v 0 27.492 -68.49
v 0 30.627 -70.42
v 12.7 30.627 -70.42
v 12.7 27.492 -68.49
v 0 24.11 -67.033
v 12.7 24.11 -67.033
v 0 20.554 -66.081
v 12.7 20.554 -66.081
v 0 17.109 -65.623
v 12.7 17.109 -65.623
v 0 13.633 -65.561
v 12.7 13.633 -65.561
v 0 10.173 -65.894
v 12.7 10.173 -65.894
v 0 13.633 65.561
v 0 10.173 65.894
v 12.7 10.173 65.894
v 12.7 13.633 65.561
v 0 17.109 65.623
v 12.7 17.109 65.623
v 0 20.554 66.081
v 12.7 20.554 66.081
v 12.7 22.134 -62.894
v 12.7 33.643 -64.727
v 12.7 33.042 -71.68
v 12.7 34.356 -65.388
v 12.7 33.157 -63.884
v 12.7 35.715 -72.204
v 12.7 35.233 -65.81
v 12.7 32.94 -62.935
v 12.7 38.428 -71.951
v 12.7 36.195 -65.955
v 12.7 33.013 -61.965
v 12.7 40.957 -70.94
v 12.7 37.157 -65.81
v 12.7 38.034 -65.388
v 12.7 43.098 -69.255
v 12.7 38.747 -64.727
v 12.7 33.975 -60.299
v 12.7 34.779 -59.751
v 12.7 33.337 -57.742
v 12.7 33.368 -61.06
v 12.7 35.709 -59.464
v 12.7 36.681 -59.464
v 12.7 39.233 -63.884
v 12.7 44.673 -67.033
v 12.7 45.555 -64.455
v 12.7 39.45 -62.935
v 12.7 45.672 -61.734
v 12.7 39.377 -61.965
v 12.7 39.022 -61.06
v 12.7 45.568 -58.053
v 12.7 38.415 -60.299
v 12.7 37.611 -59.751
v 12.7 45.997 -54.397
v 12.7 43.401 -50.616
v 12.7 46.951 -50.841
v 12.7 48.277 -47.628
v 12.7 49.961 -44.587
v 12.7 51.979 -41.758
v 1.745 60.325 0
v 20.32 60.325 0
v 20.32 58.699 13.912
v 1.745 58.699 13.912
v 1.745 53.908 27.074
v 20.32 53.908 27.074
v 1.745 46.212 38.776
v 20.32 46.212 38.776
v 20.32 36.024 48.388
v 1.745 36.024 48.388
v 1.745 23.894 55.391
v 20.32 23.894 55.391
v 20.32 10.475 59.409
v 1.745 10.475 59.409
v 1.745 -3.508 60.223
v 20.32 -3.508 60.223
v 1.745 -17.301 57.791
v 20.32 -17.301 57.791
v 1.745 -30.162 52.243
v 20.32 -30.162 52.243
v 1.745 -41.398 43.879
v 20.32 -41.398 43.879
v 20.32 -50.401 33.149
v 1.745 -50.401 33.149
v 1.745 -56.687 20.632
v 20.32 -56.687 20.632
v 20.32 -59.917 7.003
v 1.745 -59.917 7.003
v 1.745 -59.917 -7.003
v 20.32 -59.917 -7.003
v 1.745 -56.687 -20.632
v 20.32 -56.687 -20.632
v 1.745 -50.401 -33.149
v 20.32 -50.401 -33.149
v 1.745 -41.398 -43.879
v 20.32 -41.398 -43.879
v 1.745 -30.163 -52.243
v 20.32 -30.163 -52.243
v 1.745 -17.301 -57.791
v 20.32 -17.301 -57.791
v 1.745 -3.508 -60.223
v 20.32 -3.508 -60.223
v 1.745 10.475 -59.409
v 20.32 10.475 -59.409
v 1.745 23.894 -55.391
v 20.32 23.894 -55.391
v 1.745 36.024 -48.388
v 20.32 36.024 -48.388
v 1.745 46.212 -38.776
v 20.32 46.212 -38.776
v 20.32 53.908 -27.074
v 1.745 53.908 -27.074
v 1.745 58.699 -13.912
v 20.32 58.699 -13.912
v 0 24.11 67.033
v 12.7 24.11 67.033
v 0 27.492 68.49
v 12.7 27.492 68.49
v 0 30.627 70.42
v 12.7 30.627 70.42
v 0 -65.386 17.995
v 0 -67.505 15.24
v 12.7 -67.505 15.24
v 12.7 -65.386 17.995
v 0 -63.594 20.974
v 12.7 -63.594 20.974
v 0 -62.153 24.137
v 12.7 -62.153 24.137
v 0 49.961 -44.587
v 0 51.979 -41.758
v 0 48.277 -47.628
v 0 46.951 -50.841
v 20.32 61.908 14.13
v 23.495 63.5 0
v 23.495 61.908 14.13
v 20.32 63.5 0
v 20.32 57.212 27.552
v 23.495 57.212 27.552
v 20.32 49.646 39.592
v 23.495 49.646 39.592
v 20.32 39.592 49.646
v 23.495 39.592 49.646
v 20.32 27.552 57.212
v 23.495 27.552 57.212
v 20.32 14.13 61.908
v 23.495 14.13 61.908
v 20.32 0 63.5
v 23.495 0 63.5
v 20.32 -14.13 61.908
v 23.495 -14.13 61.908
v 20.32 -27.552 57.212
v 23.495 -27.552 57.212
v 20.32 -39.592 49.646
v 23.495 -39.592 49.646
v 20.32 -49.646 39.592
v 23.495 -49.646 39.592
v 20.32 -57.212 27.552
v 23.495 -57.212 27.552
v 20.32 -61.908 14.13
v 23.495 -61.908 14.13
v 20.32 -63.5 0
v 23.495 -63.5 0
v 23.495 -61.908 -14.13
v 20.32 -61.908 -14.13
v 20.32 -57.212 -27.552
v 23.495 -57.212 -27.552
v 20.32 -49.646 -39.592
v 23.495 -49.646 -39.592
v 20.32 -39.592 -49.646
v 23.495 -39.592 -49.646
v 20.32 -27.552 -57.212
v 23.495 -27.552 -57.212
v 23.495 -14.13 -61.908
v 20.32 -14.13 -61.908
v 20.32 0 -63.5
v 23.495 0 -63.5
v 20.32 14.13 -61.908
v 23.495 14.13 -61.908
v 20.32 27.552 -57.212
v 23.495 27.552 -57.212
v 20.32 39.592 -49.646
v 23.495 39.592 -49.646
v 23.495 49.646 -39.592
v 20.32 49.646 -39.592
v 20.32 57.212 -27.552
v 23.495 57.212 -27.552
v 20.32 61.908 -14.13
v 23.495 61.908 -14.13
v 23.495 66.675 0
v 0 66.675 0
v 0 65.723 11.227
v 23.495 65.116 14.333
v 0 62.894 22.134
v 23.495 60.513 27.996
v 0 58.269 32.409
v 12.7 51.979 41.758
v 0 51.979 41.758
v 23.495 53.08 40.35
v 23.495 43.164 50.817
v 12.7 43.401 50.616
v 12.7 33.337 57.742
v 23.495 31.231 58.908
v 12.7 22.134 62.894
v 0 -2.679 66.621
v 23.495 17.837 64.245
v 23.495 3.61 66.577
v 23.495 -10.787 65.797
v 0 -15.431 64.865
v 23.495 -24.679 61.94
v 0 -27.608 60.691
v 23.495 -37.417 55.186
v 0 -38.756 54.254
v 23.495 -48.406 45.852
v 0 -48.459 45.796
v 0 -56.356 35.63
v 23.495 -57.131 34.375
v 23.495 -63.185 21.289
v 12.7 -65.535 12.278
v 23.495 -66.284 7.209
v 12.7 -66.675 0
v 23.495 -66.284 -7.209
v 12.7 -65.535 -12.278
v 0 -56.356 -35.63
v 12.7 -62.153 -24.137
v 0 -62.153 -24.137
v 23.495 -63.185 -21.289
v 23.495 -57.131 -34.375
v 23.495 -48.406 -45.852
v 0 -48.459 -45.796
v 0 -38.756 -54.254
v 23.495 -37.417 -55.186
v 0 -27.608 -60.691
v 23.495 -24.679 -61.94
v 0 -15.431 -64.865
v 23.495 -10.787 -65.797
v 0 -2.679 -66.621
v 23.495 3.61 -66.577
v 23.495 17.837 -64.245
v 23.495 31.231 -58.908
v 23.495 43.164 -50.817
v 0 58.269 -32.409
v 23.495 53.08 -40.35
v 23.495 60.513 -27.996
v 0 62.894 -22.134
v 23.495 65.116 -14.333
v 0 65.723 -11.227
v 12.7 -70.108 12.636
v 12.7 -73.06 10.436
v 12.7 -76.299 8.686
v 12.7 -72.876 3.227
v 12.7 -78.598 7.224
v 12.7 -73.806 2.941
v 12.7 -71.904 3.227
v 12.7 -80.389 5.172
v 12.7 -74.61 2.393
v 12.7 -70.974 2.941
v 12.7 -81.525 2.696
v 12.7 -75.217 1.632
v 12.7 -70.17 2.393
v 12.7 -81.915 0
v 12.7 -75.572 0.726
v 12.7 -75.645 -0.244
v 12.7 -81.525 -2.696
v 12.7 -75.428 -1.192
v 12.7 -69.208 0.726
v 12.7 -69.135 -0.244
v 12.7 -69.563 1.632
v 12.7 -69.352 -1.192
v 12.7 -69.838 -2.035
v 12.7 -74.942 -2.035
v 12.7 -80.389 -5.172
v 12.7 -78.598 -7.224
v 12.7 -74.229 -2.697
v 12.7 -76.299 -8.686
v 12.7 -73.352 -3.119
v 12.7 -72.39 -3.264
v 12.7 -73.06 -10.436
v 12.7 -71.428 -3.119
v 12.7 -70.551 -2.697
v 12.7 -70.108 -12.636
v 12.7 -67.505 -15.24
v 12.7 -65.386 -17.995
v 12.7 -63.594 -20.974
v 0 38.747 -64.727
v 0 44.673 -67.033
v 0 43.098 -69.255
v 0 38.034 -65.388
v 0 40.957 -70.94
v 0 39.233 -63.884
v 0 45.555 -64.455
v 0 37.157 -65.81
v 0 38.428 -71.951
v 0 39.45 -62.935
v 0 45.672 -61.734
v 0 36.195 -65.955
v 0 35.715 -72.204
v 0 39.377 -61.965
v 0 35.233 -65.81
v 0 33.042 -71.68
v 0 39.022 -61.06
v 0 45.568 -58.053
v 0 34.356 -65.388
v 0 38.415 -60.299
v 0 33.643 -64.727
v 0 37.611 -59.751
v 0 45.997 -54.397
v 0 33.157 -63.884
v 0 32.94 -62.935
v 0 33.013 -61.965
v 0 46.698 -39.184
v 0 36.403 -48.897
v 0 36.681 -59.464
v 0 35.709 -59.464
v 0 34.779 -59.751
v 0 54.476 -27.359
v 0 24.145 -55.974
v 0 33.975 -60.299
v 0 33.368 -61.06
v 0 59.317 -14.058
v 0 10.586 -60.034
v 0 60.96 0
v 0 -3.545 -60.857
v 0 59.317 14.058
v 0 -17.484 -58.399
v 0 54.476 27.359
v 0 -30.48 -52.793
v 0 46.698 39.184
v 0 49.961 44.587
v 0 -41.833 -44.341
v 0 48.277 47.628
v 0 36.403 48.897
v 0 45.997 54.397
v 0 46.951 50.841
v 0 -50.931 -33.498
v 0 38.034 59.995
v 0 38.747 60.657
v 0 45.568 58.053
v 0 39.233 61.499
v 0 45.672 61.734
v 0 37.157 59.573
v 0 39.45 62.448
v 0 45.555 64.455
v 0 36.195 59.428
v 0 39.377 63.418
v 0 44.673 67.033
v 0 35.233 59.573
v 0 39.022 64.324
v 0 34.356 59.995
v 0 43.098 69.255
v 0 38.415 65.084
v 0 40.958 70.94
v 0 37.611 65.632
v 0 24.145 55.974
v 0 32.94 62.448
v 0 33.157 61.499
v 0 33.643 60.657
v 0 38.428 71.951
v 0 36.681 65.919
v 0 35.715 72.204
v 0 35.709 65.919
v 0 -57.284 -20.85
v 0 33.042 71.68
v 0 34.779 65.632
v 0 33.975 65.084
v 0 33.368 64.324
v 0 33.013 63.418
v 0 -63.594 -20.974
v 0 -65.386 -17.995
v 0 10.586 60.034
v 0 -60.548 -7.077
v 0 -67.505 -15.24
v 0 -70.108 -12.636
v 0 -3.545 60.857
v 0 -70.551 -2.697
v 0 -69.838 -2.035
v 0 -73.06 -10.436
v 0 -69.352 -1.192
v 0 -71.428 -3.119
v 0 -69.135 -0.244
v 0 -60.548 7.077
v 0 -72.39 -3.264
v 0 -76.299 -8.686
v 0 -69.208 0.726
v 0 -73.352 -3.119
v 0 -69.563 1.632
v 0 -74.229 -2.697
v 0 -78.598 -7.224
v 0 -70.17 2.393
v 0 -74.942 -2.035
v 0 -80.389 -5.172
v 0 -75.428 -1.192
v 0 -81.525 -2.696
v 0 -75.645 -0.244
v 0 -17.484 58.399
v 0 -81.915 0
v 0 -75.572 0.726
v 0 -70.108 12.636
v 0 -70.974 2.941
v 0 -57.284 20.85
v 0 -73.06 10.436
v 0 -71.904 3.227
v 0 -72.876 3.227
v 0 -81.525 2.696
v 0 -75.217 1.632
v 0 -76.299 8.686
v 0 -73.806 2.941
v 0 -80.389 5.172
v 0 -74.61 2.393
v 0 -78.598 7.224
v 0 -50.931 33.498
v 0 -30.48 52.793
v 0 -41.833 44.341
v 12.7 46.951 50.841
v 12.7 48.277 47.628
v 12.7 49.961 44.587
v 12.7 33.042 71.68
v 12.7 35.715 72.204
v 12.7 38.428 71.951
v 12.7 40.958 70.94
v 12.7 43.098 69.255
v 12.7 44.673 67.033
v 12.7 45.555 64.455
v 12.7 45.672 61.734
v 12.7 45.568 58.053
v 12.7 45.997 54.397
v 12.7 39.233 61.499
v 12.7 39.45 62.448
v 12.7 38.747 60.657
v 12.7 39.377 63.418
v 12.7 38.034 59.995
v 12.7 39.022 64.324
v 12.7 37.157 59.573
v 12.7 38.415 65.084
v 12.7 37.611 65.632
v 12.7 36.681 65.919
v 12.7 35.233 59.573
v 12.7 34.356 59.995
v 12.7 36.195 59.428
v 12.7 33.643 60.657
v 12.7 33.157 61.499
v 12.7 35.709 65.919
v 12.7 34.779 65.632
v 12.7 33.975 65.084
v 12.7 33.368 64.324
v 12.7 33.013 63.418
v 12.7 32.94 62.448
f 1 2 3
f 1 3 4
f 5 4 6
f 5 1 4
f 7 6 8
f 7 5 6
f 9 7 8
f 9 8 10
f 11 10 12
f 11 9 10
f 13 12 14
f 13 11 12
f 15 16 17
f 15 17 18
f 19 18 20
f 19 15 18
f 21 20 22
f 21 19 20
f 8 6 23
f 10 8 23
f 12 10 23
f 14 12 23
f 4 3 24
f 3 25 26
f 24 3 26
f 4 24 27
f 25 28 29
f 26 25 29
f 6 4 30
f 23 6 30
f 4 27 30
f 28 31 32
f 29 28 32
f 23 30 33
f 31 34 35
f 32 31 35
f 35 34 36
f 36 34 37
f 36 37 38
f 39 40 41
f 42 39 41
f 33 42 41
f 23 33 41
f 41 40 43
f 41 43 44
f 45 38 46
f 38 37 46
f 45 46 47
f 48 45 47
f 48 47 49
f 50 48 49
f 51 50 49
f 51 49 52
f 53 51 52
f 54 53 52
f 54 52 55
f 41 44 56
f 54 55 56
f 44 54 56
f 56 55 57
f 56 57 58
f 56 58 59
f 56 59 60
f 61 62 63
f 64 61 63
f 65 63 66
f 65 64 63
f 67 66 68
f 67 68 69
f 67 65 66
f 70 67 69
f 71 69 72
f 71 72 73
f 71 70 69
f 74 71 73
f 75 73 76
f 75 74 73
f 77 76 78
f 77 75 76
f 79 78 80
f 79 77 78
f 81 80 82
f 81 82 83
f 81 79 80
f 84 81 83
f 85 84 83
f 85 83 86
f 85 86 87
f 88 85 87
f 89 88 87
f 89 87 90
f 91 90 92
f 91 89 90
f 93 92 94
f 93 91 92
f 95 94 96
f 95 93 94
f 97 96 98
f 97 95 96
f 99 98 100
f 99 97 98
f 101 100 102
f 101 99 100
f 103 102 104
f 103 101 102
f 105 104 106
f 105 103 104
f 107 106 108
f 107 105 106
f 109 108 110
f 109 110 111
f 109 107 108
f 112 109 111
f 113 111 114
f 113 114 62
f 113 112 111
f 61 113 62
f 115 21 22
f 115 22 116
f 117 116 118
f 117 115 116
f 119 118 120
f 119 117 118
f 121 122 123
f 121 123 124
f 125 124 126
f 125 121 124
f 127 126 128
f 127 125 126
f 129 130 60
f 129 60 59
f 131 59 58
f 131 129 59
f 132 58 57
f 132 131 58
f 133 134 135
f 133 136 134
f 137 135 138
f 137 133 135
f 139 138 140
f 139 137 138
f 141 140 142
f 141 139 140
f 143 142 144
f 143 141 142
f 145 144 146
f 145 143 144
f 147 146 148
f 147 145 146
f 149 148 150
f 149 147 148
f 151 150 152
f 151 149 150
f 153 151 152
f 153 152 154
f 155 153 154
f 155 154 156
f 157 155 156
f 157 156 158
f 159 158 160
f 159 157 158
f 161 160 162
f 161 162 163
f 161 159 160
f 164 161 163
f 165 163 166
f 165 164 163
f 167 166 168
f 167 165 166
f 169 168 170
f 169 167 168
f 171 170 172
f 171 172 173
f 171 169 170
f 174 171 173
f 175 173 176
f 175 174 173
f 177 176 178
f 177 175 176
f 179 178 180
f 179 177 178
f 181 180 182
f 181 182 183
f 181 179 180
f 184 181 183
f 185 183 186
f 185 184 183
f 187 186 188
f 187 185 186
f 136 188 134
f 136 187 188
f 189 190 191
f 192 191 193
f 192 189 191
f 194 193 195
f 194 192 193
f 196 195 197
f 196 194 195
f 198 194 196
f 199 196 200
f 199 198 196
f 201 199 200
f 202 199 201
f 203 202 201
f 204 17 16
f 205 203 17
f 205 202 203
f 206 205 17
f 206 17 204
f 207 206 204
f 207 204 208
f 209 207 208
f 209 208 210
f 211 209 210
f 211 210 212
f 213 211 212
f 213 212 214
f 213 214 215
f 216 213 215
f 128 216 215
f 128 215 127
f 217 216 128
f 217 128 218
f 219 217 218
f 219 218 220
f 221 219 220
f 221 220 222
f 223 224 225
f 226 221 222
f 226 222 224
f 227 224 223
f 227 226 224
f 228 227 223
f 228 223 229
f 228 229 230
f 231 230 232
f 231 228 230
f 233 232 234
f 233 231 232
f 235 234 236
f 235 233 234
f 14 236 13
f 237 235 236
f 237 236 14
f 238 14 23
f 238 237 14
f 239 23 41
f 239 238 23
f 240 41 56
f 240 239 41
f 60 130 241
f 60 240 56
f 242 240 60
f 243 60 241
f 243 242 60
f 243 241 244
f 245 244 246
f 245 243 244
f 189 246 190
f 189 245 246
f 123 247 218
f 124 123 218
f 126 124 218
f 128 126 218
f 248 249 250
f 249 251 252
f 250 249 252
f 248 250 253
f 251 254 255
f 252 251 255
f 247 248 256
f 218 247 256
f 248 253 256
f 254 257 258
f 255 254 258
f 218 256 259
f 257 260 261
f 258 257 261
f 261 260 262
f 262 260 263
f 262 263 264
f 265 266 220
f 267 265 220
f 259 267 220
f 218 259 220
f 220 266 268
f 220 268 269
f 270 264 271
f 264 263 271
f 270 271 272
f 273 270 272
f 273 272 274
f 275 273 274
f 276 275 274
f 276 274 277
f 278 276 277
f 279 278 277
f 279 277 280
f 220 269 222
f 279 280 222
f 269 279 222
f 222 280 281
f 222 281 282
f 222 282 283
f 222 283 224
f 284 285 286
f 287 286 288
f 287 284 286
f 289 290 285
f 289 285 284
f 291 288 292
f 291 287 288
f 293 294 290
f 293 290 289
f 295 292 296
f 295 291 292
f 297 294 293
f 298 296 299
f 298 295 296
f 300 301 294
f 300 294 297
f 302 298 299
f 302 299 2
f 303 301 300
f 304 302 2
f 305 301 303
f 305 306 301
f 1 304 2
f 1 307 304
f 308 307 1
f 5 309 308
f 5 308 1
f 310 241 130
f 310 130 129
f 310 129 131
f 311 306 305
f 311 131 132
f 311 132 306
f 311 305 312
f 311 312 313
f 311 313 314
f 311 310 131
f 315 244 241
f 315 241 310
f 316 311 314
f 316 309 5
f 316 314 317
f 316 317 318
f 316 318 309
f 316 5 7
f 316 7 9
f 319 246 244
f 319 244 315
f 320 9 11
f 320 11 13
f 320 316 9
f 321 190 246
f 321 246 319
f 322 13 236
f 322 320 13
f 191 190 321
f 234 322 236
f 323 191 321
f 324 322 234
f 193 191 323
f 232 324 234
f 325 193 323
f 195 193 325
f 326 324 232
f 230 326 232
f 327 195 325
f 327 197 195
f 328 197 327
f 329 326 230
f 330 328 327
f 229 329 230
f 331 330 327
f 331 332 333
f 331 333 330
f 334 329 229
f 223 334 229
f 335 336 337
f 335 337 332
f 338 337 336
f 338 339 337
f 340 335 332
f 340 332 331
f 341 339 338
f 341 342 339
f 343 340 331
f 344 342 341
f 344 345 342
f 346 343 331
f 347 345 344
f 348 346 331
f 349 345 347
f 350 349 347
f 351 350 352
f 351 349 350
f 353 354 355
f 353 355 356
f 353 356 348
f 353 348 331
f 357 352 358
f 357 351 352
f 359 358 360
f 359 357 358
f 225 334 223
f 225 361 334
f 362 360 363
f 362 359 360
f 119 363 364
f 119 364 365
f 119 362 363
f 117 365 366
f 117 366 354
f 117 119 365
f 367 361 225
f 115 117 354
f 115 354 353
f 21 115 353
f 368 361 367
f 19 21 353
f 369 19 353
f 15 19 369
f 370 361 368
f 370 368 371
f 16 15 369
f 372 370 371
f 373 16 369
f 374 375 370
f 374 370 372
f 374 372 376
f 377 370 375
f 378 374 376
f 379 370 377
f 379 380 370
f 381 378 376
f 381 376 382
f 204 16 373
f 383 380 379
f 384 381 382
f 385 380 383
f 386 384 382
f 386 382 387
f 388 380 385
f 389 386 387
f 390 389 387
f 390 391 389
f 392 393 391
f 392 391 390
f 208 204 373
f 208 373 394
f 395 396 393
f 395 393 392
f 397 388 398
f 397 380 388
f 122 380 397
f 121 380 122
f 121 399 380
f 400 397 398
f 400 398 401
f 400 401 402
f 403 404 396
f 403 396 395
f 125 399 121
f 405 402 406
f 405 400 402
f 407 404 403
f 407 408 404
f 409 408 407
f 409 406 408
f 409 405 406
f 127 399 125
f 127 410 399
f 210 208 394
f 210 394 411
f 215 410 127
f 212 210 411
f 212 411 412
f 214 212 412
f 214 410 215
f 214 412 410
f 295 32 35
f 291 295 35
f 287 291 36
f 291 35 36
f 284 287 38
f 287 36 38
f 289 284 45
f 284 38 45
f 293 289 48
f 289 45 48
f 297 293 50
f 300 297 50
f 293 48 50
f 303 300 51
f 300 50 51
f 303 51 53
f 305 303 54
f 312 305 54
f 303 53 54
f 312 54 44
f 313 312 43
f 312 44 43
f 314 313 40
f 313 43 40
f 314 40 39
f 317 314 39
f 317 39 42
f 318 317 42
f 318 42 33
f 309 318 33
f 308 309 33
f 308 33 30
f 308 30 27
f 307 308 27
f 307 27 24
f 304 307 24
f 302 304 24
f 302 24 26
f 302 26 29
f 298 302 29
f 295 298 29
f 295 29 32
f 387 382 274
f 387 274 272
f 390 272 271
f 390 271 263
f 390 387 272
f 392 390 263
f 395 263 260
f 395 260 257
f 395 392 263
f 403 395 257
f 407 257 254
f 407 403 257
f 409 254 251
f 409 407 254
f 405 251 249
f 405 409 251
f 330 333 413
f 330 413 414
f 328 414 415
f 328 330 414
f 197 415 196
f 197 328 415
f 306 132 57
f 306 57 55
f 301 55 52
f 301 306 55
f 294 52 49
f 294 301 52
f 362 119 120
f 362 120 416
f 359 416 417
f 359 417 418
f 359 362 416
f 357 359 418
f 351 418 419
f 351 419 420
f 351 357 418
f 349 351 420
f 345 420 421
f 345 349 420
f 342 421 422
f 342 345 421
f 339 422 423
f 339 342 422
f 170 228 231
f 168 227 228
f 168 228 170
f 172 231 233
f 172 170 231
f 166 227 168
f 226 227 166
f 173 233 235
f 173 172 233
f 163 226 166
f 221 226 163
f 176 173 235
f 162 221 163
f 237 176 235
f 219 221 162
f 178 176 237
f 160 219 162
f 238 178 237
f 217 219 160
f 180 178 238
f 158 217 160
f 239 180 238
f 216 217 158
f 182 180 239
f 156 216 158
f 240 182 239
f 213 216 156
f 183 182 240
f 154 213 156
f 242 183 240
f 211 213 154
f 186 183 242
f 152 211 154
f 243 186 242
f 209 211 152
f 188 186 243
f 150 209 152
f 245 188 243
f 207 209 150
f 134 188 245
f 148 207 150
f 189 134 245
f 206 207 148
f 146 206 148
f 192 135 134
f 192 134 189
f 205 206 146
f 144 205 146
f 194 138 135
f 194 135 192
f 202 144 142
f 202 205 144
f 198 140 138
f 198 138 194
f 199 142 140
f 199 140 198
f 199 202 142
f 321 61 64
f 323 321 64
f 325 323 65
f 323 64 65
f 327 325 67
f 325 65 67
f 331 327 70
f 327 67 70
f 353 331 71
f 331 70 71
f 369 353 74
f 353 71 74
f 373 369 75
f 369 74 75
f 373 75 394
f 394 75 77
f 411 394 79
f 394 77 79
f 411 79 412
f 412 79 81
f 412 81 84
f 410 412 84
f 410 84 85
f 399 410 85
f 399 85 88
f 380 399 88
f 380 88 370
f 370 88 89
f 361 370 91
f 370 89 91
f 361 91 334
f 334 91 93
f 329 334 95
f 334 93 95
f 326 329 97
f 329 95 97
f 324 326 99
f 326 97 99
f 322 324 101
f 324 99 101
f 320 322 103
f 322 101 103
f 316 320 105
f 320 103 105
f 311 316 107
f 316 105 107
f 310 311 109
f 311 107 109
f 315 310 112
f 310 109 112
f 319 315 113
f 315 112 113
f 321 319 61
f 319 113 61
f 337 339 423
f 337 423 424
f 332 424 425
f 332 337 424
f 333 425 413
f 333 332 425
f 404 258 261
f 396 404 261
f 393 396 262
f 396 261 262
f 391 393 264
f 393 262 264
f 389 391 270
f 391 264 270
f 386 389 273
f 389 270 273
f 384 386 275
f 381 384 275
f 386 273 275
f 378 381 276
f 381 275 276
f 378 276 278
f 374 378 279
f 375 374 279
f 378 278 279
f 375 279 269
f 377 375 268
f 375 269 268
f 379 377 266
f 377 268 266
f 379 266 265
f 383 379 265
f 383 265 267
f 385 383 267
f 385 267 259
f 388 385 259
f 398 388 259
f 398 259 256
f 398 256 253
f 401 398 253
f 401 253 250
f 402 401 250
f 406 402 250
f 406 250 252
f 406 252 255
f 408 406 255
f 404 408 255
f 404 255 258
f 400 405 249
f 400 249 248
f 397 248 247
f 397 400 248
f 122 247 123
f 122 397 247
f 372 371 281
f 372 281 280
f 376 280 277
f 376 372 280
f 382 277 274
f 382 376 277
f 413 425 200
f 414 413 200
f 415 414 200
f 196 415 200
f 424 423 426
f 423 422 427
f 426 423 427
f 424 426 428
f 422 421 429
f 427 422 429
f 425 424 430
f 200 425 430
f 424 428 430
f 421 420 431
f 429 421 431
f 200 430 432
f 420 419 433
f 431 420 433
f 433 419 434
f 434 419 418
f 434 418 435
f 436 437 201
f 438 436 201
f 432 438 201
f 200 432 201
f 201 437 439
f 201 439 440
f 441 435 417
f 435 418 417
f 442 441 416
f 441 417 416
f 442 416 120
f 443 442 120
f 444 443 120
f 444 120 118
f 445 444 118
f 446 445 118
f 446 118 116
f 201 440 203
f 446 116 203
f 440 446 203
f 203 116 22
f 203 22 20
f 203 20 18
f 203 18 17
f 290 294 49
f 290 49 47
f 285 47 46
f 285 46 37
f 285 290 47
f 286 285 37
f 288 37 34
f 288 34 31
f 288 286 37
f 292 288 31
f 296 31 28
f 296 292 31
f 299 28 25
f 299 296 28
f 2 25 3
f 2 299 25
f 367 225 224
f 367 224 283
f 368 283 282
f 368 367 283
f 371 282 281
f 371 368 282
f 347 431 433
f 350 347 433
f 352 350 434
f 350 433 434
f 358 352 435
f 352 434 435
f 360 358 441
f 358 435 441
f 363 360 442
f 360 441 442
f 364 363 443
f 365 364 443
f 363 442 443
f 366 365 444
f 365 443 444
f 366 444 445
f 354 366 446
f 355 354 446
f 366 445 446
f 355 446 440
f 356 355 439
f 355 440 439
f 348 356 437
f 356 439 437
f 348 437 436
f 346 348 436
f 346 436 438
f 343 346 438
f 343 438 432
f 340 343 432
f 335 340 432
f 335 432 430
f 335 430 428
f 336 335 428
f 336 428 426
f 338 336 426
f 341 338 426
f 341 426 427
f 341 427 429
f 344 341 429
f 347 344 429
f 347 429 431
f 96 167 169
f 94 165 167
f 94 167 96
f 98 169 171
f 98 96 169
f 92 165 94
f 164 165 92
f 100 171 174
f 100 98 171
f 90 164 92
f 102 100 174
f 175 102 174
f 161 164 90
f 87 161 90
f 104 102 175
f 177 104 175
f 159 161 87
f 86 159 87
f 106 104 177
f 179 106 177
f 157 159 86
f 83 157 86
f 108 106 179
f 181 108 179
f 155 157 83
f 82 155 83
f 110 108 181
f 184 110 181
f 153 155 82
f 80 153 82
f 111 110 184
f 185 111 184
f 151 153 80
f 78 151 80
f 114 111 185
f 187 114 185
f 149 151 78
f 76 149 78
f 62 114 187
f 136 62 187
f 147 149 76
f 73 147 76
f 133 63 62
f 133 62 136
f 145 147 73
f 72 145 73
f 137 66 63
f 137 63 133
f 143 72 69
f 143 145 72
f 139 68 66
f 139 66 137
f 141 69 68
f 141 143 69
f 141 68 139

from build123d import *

# Parameters (mm, degrees)
BOSS_EXTRUDE1_DEPTH     = 12.7
F_1_4_CLEARANCE_HOLE1_D = 6.5278
CIRPATTERN1_COUNT       = 3
CHAMFER1_SIZE2          = 1.744648161
CHAMFER1_SIZE           = 0.635


with BuildPart() as part:
    # Sketch1 → Revolve1 (revolve)
    with BuildSketch(Plane.XY):
        Polygon((0, 66.675), (23.495, 66.675), (23.495, 63.5), (20.32, 63.5), (20.32, 60.325), (0, 60.325), align=None)
    revolve(axis=Axis((0, 0, 0), (1, 0, 0)))

    # Sketch5 → Boss-Extrude1 (add)
    with BuildSketch(Plane.ZY):
        with BuildLine():
            ThreePointArc((-61.733643772, 45.671707505), (-70.940470951, 40.9575), (-70.41968082, 30.627050022))
            ThreePointArc((-70.41968082, 30.627050022), (-67.700076965, 25.827577718), (-66.080812198, 20.554138506))
            ThreePointArc((-66.080812198, 20.554138506), (-65.542300069, 15.371802621), (-65.894280688, 10.17346537))
            ThreePointArc((-65.894280688, 10.17346537), (-57.742243797, 33.3375), (-41.757619799, 51.979388355))
            ThreePointArc((-41.757619799, 51.979388355), (-46.083521606, 49.075395572), (-50.840812198, 46.950592813))
            ThreePointArc((-50.840812198, 46.950592813), (-56.217376905, 45.716197631), (-61.733643772, 45.671707505))
        make_face()
    boss_extrude1 = extrude(amount=-BOSS_EXTRUDE1_DEPTH)

    # 1/4 Clearance Hole1 (through all)
    with Locations(Plane.ZY):
        with Locations((-62.69157898, 36.195)):
            f_1_4_clearance_hole1 = Hole(F_1_4_CLEARANCE_HOLE1_D / 2)

    # CirPattern1: Boss-Extrude1, 1/4 Clearance Hole1 ×3 about axis
    cirpattern1_axis = Axis((0, 0, 0), (1, 0, 0))
    for i in range(1, CIRPATTERN1_COUNT):
        add(boss_extrude1.rotate(cirpattern1_axis, i * 360 / CIRPATTERN1_COUNT))
        add(f_1_4_clearance_hole1.rotate(cirpattern1_axis, i * 360 / CIRPATTERN1_COUNT), mode=Mode.SUBTRACT)

    # Chamfer1
    chamfer1_edges = [part.edges().sort_by_distance(p)[0] for p in [
        (0, -60.325, 0),
    ]]
    chamfer(chamfer1_edges, length=CHAMFER1_SIZE, length2=CHAMFER1_SIZE2)


solid = part.part
